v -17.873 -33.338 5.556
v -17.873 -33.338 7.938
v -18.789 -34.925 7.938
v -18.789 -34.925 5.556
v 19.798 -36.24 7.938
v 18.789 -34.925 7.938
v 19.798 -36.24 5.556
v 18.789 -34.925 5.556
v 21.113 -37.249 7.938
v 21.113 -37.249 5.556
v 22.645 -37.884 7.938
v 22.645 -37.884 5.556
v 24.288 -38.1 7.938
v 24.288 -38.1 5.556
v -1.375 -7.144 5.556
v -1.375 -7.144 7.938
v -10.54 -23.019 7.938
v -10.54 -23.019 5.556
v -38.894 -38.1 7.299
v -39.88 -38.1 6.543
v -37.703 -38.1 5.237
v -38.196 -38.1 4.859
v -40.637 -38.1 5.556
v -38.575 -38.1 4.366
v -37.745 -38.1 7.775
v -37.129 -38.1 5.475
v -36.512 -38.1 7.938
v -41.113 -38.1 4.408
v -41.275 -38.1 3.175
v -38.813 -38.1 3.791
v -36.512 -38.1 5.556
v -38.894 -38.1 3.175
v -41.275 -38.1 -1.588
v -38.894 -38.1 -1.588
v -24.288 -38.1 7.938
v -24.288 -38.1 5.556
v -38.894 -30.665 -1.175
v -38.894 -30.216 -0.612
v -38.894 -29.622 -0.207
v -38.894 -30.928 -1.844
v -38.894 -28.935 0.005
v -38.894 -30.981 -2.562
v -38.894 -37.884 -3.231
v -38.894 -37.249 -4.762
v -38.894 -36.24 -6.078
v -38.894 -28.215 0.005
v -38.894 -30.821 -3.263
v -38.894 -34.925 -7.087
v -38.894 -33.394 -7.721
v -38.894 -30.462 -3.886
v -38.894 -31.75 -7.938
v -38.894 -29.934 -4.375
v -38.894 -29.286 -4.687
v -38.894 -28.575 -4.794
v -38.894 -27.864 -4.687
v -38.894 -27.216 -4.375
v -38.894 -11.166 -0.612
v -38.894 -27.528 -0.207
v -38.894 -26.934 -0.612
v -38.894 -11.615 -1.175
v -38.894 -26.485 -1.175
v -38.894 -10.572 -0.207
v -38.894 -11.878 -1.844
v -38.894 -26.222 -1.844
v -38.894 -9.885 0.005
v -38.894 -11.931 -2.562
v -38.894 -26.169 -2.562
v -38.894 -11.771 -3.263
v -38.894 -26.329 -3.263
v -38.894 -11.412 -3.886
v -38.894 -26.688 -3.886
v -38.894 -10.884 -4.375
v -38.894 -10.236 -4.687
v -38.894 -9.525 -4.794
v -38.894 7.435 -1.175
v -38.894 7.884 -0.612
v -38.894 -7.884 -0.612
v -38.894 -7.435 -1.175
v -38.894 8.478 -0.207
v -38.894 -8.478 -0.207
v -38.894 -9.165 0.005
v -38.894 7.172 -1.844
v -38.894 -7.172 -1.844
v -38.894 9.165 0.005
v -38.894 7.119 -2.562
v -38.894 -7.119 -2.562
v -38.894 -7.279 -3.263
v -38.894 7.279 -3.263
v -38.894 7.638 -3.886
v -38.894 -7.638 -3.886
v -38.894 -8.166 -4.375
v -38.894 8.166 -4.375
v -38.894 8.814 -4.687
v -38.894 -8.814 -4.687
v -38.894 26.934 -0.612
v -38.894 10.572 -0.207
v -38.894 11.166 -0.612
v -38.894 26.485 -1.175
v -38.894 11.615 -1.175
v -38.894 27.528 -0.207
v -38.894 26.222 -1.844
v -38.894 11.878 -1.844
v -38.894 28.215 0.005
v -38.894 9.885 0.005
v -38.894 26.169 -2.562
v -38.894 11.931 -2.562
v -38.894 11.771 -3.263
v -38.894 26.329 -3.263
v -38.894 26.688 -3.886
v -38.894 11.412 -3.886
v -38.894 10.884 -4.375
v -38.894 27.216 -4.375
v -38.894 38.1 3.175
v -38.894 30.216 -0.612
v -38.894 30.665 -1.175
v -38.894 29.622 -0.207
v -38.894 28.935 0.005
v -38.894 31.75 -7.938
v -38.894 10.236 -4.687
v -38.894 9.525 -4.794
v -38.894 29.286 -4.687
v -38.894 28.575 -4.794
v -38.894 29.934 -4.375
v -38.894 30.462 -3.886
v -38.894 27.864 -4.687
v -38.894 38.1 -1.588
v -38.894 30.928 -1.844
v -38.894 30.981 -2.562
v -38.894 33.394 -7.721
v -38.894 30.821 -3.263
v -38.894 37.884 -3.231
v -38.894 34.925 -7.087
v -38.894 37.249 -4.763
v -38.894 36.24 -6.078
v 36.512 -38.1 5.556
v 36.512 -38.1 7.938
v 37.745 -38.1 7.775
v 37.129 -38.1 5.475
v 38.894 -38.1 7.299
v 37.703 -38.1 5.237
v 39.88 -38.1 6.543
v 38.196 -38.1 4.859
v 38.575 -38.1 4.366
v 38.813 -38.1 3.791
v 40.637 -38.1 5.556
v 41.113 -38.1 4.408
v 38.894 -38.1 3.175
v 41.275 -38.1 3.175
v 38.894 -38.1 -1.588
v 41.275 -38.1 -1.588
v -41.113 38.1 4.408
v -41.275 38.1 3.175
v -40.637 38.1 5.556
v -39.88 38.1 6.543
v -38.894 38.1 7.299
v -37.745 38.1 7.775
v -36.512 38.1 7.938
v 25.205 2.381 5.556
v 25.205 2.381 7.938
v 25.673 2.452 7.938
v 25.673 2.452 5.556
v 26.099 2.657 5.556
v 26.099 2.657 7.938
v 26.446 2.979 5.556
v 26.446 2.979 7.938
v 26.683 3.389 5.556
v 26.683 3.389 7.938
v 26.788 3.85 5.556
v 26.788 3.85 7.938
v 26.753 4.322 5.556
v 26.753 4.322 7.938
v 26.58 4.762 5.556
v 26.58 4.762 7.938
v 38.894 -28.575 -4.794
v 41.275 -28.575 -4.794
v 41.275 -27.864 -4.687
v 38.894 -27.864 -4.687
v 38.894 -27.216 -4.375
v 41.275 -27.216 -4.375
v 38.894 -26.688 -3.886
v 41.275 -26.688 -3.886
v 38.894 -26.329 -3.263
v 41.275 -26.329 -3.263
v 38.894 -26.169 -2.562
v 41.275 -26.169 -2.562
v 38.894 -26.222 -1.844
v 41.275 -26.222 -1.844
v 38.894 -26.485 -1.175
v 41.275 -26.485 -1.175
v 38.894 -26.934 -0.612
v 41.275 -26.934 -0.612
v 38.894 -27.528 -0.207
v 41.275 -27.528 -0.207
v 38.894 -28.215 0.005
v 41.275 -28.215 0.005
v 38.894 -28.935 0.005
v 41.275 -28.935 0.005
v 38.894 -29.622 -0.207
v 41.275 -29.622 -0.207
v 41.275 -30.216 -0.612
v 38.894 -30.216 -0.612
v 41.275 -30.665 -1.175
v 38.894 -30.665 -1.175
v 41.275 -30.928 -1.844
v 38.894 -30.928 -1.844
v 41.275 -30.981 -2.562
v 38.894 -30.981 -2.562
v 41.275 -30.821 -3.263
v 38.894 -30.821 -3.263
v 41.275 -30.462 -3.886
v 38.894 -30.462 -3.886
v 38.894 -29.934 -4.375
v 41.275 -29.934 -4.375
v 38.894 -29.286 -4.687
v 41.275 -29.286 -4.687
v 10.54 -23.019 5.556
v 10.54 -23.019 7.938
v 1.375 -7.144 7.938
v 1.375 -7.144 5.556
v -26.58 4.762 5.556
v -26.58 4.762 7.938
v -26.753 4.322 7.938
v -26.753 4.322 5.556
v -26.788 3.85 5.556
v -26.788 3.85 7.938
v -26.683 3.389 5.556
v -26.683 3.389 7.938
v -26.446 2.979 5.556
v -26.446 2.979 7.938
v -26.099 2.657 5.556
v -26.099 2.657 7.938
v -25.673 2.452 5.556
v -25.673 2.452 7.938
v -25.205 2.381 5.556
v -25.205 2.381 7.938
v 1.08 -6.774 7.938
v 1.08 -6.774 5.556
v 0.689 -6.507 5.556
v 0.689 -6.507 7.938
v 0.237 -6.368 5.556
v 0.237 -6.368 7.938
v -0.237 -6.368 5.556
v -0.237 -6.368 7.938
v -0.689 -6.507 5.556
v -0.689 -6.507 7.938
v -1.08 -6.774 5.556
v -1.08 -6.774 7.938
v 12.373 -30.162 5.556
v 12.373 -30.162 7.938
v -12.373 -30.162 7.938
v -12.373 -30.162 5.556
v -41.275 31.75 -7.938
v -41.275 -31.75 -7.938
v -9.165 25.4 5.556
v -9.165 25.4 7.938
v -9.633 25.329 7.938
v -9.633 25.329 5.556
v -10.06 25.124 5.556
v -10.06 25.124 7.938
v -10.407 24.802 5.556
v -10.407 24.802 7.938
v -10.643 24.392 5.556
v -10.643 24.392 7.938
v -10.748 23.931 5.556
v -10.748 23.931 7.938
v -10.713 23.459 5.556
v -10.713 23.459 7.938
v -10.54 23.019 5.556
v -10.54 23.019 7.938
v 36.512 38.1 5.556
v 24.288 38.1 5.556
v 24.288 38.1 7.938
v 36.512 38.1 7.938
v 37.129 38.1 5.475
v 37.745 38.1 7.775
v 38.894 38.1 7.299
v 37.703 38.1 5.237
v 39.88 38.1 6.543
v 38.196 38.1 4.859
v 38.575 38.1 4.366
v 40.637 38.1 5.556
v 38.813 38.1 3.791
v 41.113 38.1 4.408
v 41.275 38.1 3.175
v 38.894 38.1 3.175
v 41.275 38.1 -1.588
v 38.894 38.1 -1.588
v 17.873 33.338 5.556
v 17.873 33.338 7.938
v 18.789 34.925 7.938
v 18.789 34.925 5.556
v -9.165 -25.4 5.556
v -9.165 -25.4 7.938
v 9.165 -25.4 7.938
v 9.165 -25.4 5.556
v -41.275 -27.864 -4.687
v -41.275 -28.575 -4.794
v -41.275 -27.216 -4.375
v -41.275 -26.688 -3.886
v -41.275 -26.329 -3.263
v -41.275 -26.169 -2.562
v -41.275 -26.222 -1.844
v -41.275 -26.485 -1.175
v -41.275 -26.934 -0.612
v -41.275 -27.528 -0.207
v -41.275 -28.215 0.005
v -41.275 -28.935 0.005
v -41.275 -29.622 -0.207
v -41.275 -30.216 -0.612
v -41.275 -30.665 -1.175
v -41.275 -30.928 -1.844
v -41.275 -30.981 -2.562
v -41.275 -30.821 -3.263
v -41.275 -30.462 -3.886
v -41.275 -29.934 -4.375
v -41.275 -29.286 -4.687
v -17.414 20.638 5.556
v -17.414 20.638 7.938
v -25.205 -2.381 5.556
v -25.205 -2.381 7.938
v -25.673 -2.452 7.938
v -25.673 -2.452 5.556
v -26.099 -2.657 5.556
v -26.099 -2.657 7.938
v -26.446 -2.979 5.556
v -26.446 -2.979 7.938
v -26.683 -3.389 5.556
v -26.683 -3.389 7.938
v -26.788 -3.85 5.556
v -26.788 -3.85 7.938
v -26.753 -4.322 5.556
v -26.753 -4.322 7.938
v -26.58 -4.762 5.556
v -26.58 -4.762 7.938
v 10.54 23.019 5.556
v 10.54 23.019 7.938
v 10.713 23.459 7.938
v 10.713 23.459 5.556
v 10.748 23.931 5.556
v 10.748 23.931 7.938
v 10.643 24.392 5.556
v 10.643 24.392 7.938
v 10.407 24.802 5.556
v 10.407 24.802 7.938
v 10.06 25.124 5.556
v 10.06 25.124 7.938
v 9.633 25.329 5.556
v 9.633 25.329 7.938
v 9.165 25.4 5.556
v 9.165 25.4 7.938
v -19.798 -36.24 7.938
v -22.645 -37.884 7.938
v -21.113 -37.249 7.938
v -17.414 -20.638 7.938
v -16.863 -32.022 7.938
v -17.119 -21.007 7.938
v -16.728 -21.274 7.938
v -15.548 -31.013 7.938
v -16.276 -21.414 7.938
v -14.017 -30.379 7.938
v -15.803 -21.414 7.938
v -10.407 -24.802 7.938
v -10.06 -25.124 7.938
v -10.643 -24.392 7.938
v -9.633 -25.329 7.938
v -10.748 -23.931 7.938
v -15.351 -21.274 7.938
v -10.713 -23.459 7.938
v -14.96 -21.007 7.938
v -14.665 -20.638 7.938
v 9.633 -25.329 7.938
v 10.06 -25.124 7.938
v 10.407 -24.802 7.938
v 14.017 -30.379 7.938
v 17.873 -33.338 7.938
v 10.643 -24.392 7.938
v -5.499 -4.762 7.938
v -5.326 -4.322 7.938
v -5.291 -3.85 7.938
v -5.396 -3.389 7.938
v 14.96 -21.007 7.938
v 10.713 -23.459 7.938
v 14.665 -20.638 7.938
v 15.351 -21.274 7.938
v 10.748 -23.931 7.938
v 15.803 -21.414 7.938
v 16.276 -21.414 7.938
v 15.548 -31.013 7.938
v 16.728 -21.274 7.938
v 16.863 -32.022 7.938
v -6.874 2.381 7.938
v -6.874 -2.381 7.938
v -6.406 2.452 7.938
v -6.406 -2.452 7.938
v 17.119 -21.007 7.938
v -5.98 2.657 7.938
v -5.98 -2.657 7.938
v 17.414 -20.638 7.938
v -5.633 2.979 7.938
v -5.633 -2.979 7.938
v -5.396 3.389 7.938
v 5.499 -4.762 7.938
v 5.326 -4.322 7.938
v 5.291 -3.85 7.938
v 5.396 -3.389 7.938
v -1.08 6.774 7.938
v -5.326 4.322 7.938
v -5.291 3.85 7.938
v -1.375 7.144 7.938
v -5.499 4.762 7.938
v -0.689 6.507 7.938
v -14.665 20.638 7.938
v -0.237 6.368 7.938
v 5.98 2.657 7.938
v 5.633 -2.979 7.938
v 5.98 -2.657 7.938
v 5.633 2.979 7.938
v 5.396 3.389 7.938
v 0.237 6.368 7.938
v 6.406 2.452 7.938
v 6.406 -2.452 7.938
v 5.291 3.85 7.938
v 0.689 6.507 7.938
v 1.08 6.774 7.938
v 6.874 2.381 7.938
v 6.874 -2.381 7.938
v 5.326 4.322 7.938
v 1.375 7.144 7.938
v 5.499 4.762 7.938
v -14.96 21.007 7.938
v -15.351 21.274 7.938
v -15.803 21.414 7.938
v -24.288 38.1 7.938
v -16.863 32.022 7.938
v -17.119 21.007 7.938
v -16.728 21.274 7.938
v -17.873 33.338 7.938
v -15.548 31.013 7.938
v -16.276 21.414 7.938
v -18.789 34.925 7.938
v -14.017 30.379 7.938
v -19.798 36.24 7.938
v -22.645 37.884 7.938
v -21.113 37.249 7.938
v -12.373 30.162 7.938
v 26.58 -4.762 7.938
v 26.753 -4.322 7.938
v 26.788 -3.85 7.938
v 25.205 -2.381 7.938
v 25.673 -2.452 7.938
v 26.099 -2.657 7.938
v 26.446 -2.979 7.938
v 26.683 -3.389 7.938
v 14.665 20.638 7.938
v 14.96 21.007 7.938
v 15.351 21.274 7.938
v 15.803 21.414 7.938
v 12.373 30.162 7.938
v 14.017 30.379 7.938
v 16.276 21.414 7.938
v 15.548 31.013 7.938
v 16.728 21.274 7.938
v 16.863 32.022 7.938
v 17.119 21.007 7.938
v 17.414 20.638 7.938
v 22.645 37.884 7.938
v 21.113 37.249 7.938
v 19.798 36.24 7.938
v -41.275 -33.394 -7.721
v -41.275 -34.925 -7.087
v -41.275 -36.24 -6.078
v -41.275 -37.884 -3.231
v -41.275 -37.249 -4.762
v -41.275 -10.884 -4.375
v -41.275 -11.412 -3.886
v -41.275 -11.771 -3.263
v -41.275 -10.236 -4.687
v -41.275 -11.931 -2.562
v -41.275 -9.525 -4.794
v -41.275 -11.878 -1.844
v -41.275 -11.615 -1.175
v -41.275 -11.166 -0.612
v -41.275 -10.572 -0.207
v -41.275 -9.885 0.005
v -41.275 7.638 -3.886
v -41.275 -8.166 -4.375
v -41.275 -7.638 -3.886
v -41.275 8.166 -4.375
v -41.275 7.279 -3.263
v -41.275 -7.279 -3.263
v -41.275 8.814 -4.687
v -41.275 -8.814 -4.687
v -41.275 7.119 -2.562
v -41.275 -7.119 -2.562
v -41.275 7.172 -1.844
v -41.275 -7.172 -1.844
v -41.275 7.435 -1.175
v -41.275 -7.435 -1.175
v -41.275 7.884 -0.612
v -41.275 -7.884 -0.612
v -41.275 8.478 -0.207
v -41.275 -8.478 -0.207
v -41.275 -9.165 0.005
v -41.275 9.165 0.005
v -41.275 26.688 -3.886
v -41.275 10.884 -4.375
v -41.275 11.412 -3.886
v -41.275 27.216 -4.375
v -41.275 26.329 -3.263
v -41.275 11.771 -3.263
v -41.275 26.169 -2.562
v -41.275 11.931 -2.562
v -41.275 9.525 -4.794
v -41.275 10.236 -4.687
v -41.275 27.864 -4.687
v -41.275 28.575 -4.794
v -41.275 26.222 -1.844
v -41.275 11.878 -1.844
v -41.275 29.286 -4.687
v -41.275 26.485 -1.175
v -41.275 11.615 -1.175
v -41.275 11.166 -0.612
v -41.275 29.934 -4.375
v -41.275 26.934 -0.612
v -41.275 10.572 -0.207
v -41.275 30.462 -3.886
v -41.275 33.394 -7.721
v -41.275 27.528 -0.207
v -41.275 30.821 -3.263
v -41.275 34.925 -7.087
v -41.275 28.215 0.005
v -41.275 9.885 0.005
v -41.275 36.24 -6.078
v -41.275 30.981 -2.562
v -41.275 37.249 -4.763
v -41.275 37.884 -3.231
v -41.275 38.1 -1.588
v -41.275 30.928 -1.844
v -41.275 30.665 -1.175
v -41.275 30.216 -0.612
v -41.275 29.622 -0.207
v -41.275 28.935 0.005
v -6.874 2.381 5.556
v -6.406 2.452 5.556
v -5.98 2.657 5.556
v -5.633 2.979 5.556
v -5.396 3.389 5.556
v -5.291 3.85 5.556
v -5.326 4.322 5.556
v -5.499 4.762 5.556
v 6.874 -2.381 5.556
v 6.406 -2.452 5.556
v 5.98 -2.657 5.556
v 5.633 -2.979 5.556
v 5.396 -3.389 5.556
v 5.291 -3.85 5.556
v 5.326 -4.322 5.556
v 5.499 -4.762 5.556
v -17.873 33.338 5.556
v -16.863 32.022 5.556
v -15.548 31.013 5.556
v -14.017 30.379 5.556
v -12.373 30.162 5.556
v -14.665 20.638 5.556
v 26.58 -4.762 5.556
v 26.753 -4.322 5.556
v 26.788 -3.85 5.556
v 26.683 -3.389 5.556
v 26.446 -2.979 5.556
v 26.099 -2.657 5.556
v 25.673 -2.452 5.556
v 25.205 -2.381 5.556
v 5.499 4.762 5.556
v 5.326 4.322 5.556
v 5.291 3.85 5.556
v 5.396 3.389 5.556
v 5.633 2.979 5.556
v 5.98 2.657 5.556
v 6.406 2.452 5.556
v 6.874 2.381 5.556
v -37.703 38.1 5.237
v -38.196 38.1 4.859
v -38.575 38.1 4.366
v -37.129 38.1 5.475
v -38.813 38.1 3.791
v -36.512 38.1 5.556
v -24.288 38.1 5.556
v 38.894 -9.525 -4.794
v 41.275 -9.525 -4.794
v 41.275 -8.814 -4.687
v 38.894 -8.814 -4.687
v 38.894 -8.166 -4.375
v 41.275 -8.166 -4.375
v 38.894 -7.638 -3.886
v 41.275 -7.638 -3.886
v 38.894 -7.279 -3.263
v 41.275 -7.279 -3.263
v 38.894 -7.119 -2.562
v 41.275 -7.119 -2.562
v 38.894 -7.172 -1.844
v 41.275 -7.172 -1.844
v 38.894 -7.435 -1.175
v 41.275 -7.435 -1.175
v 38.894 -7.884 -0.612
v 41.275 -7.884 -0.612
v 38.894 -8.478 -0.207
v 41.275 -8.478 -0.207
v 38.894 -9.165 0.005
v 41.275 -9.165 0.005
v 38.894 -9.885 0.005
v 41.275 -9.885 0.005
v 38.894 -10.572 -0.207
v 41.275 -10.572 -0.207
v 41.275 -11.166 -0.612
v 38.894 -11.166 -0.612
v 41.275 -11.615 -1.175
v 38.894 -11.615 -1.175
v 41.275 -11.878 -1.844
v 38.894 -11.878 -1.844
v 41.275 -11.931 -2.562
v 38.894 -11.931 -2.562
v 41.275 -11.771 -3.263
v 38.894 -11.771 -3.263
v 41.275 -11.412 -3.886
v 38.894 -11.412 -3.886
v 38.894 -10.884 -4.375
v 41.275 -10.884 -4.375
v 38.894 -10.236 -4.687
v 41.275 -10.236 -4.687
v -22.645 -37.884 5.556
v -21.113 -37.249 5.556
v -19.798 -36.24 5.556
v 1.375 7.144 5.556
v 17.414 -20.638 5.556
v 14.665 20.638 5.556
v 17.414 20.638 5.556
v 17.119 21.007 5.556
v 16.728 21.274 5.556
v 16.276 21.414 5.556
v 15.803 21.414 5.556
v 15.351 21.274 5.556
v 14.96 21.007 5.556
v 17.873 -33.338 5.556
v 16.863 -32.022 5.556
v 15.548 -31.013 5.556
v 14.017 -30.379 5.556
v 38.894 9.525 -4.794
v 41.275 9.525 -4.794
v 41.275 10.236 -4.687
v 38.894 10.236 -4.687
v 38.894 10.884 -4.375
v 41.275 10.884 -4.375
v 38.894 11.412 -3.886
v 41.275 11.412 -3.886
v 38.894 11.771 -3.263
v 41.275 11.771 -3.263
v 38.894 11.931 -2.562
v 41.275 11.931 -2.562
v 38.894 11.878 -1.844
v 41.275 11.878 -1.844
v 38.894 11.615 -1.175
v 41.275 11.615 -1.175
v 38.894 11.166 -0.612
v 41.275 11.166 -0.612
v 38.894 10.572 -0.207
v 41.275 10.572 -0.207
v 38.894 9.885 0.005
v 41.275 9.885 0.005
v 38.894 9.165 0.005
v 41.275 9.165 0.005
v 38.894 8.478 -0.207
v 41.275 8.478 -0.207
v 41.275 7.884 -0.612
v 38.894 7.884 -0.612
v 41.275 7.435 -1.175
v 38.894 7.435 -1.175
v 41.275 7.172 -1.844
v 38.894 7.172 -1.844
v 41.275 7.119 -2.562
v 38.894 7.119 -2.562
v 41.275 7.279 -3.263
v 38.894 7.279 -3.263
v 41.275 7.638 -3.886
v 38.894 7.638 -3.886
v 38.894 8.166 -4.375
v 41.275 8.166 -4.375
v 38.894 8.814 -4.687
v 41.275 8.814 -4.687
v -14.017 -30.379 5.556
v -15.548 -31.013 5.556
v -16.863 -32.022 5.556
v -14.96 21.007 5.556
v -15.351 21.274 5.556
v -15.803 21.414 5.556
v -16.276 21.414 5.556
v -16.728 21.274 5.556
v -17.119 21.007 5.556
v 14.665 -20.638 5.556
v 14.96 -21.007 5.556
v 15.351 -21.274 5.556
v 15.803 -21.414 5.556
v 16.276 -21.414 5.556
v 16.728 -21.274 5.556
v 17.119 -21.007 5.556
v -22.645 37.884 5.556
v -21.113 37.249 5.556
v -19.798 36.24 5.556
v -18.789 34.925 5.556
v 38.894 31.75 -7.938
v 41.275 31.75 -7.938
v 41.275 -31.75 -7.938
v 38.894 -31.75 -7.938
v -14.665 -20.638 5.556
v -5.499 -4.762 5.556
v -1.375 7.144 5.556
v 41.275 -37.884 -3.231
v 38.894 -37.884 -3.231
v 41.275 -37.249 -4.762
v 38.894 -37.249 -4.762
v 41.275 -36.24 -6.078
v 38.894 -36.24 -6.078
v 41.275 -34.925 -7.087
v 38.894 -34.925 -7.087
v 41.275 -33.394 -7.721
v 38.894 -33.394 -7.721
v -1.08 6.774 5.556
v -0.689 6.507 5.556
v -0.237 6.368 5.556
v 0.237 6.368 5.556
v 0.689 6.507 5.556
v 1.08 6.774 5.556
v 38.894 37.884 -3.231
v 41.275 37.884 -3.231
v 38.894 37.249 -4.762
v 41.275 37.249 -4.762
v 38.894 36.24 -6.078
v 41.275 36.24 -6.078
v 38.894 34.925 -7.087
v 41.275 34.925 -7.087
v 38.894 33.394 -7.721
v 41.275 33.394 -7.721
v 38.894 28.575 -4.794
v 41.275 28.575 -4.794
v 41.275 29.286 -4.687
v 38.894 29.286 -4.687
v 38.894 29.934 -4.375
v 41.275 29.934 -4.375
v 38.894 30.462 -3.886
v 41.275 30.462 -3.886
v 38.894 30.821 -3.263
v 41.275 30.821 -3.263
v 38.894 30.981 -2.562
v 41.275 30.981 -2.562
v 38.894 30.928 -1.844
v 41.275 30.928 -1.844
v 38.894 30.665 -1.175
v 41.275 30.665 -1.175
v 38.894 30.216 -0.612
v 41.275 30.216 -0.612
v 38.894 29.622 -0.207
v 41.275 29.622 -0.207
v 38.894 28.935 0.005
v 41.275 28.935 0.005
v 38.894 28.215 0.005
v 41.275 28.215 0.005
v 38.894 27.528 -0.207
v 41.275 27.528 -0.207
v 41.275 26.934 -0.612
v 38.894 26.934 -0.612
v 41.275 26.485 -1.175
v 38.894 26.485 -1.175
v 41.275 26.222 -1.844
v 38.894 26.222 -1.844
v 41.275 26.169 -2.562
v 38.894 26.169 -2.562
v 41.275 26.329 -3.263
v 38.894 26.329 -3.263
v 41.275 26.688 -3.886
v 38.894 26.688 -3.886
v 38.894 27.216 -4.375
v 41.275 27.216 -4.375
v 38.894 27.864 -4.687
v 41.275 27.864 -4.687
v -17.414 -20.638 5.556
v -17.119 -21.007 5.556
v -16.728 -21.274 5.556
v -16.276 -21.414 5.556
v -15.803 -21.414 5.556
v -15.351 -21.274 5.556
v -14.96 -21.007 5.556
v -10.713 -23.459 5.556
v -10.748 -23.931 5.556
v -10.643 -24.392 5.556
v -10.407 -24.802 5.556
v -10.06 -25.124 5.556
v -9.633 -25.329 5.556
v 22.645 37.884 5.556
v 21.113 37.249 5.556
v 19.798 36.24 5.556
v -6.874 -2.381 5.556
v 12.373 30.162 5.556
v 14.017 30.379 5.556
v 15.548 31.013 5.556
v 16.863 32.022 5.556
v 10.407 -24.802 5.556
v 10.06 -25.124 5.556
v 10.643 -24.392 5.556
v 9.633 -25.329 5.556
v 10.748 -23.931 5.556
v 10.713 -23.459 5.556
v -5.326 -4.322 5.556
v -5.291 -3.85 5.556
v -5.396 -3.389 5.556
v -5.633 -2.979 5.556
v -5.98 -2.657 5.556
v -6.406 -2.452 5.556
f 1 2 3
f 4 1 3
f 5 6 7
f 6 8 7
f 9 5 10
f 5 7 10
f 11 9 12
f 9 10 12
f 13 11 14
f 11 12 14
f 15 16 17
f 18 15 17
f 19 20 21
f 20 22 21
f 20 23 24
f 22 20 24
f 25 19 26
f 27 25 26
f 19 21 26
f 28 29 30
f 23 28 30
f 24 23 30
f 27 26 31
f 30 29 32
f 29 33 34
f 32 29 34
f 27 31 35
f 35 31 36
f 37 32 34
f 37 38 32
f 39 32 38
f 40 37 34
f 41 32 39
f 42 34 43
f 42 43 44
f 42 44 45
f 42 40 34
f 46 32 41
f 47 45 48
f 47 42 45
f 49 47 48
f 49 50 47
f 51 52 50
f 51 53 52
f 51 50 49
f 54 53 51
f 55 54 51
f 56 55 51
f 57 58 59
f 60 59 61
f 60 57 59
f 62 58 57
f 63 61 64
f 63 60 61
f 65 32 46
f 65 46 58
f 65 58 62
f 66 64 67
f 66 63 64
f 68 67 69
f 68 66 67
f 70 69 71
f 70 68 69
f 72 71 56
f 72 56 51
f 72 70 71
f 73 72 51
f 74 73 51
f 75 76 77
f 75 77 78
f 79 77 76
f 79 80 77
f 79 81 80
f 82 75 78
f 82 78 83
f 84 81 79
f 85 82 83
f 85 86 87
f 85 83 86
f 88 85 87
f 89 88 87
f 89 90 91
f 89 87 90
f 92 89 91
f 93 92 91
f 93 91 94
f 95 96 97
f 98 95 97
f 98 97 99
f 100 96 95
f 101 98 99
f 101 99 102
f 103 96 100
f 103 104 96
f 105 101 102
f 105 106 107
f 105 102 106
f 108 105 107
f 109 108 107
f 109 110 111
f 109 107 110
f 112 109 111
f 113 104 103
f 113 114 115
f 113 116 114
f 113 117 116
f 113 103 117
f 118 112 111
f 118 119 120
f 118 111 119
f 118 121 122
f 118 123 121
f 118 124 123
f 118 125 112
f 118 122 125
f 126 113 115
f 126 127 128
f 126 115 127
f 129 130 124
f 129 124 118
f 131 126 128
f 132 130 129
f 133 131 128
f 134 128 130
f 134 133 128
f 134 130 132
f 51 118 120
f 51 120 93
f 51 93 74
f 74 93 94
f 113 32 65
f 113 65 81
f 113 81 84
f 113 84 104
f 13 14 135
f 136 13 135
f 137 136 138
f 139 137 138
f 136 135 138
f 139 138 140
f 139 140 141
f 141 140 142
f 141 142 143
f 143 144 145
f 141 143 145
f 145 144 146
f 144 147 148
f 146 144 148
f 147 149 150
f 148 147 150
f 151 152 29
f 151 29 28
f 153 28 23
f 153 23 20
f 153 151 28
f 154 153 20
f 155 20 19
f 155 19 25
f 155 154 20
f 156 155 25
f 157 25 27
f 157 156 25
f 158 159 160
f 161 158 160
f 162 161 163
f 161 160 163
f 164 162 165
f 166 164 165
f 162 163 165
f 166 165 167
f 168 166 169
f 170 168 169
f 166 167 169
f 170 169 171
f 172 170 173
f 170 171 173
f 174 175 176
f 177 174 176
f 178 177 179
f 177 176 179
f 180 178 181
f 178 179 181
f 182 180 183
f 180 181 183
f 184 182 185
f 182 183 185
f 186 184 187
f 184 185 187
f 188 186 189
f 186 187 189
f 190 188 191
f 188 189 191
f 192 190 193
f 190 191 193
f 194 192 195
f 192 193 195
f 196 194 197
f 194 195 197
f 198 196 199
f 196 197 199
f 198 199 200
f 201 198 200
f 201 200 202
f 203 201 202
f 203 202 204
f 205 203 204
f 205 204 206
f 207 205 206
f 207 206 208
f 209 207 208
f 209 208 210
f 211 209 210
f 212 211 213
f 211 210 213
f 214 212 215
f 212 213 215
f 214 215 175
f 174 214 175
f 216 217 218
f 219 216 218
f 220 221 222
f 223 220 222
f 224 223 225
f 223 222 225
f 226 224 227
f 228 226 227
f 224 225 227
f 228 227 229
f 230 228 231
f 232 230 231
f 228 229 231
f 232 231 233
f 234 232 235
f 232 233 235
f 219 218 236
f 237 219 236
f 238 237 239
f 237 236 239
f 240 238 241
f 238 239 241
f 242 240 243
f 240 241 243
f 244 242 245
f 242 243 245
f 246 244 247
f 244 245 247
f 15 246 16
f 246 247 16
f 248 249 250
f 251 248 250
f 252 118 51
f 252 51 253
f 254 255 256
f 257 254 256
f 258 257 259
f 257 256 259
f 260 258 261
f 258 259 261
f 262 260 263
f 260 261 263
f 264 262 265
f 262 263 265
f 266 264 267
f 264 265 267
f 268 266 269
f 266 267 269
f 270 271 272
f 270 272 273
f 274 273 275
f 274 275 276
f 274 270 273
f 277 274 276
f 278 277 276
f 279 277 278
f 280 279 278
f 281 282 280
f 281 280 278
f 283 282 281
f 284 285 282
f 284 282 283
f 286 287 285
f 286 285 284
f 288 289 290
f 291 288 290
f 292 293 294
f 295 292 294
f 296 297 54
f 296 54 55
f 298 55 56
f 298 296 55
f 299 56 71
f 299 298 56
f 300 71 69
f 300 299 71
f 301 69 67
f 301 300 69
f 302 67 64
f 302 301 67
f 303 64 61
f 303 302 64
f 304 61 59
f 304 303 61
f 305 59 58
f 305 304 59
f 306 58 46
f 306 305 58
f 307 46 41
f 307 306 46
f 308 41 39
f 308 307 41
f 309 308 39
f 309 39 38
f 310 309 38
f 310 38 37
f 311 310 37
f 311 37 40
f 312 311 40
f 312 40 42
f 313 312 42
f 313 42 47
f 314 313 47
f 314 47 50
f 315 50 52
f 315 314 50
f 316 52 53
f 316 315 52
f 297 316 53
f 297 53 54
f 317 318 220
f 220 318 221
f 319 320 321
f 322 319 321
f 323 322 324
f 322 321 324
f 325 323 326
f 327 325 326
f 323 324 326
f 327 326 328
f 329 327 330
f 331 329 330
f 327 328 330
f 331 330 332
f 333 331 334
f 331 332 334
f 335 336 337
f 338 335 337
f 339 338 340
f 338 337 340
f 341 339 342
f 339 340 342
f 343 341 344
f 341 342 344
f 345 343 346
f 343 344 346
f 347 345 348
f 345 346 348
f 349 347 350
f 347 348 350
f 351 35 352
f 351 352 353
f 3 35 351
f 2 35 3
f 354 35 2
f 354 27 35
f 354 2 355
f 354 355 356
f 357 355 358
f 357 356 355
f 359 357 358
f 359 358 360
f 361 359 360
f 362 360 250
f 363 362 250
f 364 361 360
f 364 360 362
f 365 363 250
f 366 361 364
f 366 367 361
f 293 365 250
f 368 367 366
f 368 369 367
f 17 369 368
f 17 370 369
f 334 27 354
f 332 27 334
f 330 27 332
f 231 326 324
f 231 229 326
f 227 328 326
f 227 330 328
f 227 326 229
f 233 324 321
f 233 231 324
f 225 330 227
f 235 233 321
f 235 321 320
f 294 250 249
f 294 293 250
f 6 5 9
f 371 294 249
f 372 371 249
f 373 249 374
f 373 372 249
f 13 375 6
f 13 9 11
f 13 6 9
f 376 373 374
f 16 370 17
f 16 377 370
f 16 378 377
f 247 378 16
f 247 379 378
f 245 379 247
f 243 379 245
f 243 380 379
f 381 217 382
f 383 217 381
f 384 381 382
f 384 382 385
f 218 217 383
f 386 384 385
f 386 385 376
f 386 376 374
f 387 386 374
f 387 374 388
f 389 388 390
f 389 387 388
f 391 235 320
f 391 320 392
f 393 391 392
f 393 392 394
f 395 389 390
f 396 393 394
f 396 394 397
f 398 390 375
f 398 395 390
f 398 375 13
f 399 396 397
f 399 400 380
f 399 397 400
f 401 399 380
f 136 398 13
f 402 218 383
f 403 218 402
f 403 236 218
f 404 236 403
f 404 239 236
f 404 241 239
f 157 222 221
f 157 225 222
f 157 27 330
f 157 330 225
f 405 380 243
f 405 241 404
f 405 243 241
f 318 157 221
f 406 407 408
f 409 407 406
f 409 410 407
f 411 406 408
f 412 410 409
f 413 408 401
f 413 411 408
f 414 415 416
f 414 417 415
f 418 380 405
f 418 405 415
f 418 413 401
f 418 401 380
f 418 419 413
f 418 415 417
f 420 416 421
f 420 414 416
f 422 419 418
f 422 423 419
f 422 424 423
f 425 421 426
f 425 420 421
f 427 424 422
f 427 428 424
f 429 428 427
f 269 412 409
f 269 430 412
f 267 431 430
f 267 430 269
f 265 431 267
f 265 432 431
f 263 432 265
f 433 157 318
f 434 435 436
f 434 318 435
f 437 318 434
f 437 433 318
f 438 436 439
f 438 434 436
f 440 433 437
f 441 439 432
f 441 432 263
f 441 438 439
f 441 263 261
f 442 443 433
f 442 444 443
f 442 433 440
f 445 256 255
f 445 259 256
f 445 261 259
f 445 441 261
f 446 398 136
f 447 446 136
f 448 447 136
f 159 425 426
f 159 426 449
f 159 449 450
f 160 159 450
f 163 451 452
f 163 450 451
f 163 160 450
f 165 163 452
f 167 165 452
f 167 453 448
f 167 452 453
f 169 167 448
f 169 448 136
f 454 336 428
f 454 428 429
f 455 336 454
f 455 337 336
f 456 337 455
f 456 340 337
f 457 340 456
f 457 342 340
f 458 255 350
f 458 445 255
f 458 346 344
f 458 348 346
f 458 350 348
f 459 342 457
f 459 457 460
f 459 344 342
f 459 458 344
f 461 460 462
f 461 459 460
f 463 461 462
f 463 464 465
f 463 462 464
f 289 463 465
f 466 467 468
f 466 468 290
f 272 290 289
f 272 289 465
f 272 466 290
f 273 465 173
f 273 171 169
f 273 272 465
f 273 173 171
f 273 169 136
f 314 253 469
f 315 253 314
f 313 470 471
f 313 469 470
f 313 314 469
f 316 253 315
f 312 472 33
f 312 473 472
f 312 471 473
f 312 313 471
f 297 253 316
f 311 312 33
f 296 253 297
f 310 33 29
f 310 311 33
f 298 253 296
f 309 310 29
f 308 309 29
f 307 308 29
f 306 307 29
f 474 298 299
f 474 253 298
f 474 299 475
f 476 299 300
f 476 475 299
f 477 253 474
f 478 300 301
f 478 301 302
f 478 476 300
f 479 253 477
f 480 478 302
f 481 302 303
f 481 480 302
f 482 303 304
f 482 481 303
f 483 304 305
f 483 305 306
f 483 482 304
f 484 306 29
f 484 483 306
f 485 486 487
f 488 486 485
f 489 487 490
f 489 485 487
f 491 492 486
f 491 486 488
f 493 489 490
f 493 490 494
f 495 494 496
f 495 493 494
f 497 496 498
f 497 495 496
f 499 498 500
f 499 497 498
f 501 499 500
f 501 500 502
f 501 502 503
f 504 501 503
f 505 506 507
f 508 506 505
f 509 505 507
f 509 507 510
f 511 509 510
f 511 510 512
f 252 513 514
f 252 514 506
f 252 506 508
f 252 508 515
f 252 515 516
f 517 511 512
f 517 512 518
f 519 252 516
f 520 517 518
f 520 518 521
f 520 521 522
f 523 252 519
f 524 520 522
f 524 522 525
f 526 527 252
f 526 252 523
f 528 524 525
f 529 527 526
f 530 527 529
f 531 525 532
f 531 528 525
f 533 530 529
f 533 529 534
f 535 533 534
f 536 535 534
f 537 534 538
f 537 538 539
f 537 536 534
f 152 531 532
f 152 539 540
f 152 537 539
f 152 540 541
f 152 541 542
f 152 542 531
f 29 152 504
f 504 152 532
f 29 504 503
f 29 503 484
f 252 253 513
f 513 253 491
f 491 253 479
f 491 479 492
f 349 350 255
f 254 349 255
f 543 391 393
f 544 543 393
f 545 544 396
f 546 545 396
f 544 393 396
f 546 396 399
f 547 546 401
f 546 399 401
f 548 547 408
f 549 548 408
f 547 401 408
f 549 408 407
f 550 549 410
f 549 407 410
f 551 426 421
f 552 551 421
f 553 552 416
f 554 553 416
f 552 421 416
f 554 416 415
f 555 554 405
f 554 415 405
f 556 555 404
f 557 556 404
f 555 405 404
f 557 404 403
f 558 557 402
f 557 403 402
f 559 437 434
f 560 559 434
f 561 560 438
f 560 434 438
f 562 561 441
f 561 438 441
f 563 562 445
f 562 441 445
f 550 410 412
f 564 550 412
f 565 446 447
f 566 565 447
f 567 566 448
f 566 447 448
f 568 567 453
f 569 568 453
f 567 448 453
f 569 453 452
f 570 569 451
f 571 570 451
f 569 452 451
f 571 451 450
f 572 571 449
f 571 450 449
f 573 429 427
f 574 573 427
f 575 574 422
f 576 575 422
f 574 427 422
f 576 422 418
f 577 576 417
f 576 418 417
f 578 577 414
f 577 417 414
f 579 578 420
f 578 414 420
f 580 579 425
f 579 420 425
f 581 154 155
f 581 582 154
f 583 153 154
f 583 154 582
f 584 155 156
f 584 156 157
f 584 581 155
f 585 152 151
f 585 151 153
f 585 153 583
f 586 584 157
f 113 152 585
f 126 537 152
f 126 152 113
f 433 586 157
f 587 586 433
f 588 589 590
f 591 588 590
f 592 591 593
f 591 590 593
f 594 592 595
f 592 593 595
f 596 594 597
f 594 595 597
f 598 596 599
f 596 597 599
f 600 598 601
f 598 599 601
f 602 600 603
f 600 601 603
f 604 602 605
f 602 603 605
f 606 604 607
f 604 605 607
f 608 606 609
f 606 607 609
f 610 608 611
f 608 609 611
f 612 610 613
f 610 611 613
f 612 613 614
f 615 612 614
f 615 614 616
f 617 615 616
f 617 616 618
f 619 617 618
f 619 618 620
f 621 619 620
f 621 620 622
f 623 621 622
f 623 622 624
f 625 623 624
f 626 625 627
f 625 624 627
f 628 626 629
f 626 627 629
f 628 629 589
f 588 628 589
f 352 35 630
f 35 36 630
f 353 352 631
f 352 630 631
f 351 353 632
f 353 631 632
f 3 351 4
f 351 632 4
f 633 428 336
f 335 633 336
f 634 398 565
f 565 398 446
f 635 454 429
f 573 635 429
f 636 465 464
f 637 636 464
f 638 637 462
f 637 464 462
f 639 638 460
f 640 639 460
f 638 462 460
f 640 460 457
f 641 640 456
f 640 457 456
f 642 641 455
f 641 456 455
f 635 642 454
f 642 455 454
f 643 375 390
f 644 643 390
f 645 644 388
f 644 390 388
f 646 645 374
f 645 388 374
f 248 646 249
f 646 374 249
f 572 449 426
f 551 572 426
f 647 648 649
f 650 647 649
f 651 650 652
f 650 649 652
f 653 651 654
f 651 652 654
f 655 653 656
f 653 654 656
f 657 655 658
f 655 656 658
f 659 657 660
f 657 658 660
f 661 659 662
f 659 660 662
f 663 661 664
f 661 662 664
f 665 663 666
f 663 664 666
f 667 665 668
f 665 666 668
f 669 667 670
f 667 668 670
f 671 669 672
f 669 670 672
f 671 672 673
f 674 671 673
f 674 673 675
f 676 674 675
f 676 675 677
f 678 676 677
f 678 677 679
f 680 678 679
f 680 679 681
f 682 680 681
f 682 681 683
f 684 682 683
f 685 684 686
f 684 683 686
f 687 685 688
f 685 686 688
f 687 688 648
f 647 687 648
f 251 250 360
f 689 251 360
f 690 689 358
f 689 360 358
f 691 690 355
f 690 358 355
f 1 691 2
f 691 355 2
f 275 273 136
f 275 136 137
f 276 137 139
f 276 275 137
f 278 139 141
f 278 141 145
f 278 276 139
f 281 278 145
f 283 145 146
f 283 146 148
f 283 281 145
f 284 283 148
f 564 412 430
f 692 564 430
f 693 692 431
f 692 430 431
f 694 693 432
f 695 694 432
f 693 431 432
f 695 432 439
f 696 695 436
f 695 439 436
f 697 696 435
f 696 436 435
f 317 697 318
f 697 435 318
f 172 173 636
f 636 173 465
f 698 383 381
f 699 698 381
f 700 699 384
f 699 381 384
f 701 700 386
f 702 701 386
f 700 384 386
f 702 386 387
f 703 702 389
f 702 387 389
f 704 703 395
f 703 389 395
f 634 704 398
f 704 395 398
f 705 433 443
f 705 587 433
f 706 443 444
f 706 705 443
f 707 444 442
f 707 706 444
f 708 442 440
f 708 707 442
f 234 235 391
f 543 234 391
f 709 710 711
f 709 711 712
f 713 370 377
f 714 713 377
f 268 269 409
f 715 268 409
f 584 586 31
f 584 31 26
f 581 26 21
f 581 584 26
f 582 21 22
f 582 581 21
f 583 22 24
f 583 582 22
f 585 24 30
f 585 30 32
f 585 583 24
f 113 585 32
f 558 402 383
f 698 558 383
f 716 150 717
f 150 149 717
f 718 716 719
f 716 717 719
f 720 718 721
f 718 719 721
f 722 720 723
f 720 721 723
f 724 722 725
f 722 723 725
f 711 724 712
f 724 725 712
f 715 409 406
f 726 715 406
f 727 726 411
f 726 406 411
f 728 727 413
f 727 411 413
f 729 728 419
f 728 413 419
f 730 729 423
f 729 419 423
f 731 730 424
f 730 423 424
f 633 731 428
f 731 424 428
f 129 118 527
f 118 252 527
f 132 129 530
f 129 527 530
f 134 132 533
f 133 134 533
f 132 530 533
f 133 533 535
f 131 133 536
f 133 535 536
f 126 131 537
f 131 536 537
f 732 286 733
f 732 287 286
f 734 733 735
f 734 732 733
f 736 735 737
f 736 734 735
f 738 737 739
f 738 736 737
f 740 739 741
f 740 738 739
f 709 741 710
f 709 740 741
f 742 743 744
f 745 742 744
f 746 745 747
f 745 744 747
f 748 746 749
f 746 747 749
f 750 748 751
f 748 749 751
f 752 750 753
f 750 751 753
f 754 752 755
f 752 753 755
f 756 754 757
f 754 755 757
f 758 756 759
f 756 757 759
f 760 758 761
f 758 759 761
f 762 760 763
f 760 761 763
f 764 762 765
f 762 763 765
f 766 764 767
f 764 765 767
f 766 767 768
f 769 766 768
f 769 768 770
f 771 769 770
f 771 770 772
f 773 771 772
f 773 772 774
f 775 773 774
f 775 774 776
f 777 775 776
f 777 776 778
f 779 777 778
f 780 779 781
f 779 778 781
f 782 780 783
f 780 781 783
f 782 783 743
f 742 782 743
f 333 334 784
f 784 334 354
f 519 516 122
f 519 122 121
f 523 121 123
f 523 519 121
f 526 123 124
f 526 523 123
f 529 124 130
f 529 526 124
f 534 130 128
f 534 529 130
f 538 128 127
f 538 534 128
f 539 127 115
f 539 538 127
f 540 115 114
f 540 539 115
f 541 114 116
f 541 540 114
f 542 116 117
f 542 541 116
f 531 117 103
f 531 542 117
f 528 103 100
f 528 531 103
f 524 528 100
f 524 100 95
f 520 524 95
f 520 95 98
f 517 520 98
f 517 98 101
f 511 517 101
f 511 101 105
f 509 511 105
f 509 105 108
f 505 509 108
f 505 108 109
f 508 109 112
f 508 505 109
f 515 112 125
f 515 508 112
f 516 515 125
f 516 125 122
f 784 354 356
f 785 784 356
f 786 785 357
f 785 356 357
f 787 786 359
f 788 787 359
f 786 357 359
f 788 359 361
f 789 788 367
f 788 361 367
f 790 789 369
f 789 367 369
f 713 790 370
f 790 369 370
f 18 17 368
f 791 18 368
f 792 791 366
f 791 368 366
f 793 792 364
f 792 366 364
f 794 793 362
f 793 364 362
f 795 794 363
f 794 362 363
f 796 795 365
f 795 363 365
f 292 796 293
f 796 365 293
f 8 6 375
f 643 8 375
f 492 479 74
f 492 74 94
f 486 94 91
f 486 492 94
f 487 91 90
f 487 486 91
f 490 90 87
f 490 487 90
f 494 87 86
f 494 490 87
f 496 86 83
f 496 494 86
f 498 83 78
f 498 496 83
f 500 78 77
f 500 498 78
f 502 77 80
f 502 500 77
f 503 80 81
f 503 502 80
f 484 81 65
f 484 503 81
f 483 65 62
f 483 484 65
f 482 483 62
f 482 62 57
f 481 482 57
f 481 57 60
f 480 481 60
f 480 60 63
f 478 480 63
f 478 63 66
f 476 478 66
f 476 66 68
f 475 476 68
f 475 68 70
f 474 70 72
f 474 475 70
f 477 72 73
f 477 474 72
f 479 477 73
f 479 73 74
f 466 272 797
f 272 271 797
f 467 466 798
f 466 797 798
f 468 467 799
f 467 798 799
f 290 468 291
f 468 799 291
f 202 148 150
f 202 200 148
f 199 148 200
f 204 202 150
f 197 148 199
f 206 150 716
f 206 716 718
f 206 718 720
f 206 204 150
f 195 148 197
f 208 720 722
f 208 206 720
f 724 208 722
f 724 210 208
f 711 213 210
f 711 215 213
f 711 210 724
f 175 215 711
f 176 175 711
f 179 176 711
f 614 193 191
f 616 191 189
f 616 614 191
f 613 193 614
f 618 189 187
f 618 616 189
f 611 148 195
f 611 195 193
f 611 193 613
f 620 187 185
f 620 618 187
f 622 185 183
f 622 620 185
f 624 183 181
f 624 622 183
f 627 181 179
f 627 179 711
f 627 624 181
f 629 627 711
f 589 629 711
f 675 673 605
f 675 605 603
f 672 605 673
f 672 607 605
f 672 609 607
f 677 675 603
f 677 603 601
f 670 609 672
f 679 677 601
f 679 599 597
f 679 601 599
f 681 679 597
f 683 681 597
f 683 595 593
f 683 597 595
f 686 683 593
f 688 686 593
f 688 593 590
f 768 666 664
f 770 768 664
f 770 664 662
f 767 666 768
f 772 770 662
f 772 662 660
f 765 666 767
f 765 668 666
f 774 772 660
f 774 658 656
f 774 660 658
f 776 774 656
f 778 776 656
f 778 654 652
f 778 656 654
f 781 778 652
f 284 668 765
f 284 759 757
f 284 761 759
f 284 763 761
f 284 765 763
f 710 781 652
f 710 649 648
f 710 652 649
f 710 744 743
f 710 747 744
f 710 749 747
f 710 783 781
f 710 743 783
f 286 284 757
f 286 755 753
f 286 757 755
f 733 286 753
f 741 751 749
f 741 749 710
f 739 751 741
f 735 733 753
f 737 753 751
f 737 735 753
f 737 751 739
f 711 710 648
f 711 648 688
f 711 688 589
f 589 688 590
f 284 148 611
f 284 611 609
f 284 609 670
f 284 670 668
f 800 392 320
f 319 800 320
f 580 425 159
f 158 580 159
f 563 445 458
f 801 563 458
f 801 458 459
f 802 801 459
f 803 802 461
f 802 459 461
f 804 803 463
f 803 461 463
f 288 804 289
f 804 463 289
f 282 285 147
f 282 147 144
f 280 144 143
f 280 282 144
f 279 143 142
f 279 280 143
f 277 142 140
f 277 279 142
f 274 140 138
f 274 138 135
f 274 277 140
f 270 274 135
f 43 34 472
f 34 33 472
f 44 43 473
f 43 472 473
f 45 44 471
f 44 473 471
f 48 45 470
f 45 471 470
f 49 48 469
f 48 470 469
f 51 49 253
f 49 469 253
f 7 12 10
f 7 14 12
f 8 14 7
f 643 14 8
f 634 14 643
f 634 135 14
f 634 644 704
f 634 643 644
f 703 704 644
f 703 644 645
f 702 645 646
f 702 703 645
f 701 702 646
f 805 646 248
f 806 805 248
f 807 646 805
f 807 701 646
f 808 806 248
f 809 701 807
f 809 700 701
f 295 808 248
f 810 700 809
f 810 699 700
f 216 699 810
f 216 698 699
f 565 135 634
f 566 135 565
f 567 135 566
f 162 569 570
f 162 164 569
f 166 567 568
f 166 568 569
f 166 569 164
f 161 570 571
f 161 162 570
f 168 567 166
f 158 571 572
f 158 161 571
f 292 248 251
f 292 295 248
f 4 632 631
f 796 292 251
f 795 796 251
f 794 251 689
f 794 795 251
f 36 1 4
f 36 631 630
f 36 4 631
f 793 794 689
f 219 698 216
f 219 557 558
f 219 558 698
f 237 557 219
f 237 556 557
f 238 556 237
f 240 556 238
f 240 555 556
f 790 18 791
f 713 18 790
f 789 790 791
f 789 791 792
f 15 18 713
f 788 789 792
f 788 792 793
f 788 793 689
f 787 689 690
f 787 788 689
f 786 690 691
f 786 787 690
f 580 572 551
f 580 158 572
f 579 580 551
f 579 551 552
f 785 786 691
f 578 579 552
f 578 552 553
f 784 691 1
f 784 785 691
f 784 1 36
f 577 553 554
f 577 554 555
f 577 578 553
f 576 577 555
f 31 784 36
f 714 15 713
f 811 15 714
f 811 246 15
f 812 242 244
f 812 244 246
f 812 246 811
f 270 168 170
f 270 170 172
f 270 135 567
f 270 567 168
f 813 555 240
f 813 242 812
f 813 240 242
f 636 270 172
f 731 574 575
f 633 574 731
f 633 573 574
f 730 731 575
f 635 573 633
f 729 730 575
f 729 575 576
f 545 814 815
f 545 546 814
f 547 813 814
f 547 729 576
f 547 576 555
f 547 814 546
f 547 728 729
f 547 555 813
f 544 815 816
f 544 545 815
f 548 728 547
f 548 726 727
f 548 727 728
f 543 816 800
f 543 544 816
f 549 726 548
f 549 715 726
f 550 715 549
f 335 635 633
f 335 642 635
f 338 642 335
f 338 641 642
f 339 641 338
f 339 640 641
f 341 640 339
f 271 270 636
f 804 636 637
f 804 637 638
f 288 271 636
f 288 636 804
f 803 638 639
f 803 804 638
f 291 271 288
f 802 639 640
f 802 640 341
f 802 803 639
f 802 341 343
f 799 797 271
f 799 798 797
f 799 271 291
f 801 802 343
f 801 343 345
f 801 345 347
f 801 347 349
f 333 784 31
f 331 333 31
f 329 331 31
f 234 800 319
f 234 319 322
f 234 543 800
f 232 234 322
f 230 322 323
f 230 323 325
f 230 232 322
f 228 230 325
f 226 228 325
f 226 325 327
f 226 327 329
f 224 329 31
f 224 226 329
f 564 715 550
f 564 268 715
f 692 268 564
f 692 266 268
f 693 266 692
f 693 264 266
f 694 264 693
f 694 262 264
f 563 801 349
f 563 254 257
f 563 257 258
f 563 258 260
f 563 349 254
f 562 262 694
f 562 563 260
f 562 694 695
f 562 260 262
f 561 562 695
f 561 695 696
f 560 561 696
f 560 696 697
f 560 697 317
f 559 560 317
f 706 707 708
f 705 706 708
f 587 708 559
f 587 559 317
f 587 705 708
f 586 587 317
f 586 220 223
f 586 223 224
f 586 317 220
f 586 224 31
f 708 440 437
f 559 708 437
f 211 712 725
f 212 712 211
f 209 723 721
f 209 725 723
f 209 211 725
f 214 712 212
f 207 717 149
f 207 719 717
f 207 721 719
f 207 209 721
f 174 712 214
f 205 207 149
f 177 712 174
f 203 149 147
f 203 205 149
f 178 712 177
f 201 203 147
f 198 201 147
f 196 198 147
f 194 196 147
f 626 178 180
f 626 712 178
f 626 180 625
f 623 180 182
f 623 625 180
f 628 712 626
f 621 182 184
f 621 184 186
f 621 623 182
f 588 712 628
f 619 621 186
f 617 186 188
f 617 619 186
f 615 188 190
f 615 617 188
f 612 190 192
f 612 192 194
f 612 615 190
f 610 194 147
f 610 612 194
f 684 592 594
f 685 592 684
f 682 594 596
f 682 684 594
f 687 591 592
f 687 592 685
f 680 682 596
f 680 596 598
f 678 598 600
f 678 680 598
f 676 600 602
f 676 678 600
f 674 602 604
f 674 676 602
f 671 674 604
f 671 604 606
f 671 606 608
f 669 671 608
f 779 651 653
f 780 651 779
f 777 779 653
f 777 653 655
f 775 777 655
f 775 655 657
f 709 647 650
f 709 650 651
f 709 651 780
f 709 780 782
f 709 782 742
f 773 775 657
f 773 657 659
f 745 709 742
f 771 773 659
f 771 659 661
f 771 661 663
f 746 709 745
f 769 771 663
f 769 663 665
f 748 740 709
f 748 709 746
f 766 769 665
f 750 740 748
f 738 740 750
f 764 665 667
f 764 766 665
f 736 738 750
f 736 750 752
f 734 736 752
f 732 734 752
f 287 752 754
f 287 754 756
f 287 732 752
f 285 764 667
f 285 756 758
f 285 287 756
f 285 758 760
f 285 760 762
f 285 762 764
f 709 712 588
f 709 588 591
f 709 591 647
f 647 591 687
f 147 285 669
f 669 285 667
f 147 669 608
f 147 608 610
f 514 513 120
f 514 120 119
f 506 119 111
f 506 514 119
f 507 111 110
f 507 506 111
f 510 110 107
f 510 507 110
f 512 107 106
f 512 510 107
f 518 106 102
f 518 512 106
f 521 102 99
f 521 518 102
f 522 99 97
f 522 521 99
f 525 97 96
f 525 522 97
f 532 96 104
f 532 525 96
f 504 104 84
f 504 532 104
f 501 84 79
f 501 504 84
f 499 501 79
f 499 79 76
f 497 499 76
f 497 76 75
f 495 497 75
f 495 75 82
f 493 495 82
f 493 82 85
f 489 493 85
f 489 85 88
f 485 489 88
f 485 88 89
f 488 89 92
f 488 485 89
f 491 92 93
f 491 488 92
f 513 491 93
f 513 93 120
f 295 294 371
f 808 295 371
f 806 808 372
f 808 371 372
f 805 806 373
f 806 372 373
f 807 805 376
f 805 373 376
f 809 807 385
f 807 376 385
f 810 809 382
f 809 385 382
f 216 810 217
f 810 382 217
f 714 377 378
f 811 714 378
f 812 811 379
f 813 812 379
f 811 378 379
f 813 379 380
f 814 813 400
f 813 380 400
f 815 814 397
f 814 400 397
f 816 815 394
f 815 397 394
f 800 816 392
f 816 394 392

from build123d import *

# Parameters (mm, degrees)
BASE_FLANGE1_DEPTH = 38.1
CUT_EXTRUDE1_DEPTH = 2.38125
FILLET1_R          = 6.35
SKETCH7_R          = 2.413
CUT_EXTRUDE2_DEPTH = 2.38125
FILLET2_R          = 6.35


# Sheet-metal steps are written as plain solids
with BuildPart() as part:
    # Sketch1 → Base-Flange1 (new, symmetric)
    with BuildSketch(Plane(origin=(0, 0, 0), x_dir=(1, 0, 0), z_dir=(0, 1, 0))):
        with BuildLine():
            Line((-41.275, 7.9375), (-41.275, -3.175))
            ThreePointArc((-41.275, -3.175), (-39.880096045, -6.542596045), (-36.5125, -7.9375))
            Line((-36.5125, -7.9375), (36.5125, -7.9375))
            ThreePointArc((36.5125, -7.9375), (39.880096045, -6.542596045), (41.275, -3.175))
            Line((41.275, -3.175), (41.275, 7.9375))
            Line((41.275, 7.9375), (38.89375, 7.9375))
            Line((38.89375, 7.9375), (38.89375, -3.175))
            ThreePointArc((38.89375, -3.175), (38.196298023, -4.858798023), (36.5125, -5.55625))
            Line((36.5125, -5.55625), (-36.5125, -5.55625))
            ThreePointArc((-36.5125, -5.55625), (-38.196298023, -4.858798023), (-38.89375, -3.175))
            Line((-38.89375, -3.175), (-38.89375, 7.9375))
            Line((-38.89375, 7.9375), (-41.275, 7.9375))
        make_face()
    extrude(amount=BASE_FLANGE1_DEPTH, both=True)

    # Sketch6 → Cut-Extrude1 (cut)
    with BuildSketch(Plane.XY.offset(7.9375)):
        with BuildLine():
            Line((-10.540250852, 23.01875), (-1.374815329, 7.14375))
            ThreePointArc((-1.374815329, 7.14375), (0, 6.35), (1.374815329, 7.14375))
            Line((1.374815329, 7.14375), (10.540250852, 23.01875))
            ThreePointArc((10.540250852, 23.01875), (10.540250852, 24.60625), (9.165435523, 25.4))
            Line((9.165435523, 25.4), (-9.165435523, 25.4))
            ThreePointArc((-9.165435523, 25.4), (-10.540250852, 24.60625), (-10.540250852, 23.01875))
        make_face()
        with BuildLine():
            Line((14.664696837, 20.6375), (5.499261314, 4.7625))
            ThreePointArc((5.499261314, 4.7625), (5.499261314, 3.175), (6.874076643, 2.38125))
            Line((6.874076643, 2.38125), (25.204947689, 2.38125))
            ThreePointArc((25.204947689, 2.38125), (26.579763018, 3.175), (26.579763018, 4.7625))
            Line((26.579763018, 4.7625), (17.414327494, 20.6375))
            ThreePointArc((17.414327494, 20.6375), (16.039512166, 21.43125), (14.664696837, 20.6375))
        make_face()
        with BuildLine():
            Line((25.204947689, -2.38125), (6.874076643, -2.38125))
            ThreePointArc((6.874076643, -2.38125), (5.499261314, -3.175), (5.499261314, -4.7625))
            Line((5.499261314, -4.7625), (14.664696837, -20.6375))
            ThreePointArc((14.664696837, -20.6375), (16.039512166, -21.43125), (17.414327494, -20.6375))
            Line((17.414327494, -20.6375), (26.579763018, -4.7625))
            ThreePointArc((26.579763018, -4.7625), (26.579763018, -3.175), (25.204947689, -2.38125))
        make_face()
        with BuildLine():
            Line((10.540250852, -23.01875), (1.374815329, -7.14375))
            ThreePointArc((1.374815329, -7.14375), (0, -6.35), (-1.374815329, -7.14375))
            Line((-1.374815329, -7.14375), (-10.540250852, -23.01875))
            ThreePointArc((-10.540250852, -23.01875), (-10.540250852, -24.60625), (-9.165435523, -25.4))
            Line((-9.165435523, -25.4), (9.165435523, -25.4))
            ThreePointArc((9.165435523, -25.4), (10.540250852, -24.60625), (10.540250852, -23.01875))
        make_face()
        with BuildLine():
            Line((-14.664696837, -20.6375), (-5.499261314, -4.7625))
            ThreePointArc((-5.499261314, -4.7625), (-5.499261314, -3.175), (-6.874076643, -2.38125))
            Line((-6.874076643, -2.38125), (-25.204947689, -2.38125))
            ThreePointArc((-25.204947689, -2.38125), (-26.579763018, -3.175), (-26.579763018, -4.7625))
            Line((-26.579763018, -4.7625), (-17.414327494, -20.6375))
            ThreePointArc((-17.414327494, -20.6375), (-16.039512166, -21.43125), (-14.664696837, -20.6375))
        make_face()
        with BuildLine():
            Line((-25.204947689, 2.38125), (-6.874076643, 2.38125))
            ThreePointArc((-6.874076643, 2.38125), (-5.499261314, 3.175), (-5.499261314, 4.7625))
            Line((-5.499261314, 4.7625), (-14.664696837, 20.6375))
            ThreePointArc((-14.664696837, 20.6375), (-16.039512166, 21.43125), (-17.414327494, 20.6375))
            Line((-17.414327494, 20.6375), (-26.579763018, 4.7625))
            ThreePointArc((-26.579763018, 4.7625), (-26.579763018, 3.175), (-25.204947689, 2.38125))
        make_face()
        with BuildLine():
            Line((-20.622229928, 38.1), (-17.872599271, 33.3375))
            ThreePointArc((-17.872599271, 33.3375), (-15.548337957, 31.013238686), (-12.373337957, 30.1625))
            Line((-12.373337957, 30.1625), (12.373337957, 30.1625))
            ThreePointArc((12.373337957, 30.1625), (15.548337957, 31.013238686), (17.872599271, 33.3375))
            Line((17.872599271, 33.3375), (20.622229928, 38.1))
            Line((20.622229928, 38.1), (-20.622229928, 38.1))
        make_face()
        with BuildLine():
            Line((-20.622229928, -38.1), (20.622229928, -38.1))
            Line((20.622229928, -38.1), (17.872599271, -33.3375))
            ThreePointArc((17.872599271, -33.3375), (15.548337957, -31.013238686), (12.373337957, -30.1625))
            Line((12.373337957, -30.1625), (-12.373337957, -30.1625))
            ThreePointArc((-12.373337957, -30.1625), (-15.548337957, -31.013238686), (-17.872599271, -33.3375))
            Line((-17.872599271, -33.3375), (-20.622229928, -38.1))
        make_face()
    extrude(amount=-CUT_EXTRUDE1_DEPTH, mode=Mode.SUBTRACT)

    # Fillet1
    fillet1_edges = [part.edges().sort_by_distance(p)[0] for p in [
        (20.622229928, -38.1, 6.746875),
        (-20.622229928, -38.1, 6.746875),
        (-20.622229928, 38.1, 6.746875),
        (20.622229928, 38.1, 6.746875),
    ]]
    fillet(fillet1_edges, radius=FILLET1_R)

    # Sketch7 → Cut-Extrude2 (cut)
    with BuildSketch(Plane(origin=(41.275, 0, 0), x_dir=(0, 0, -1), z_dir=(1, 0, 0))):
        with Locations((2.38125, 28.575)):
            Circle(SKETCH7_R)
        with Locations((2.38125, 9.525)):
            Circle(SKETCH7_R)
        with Locations((2.38125, -9.525)):
            Circle(SKETCH7_R)
        with Locations((2.38125, -28.575)):
            Circle(SKETCH7_R)
    cut_extrude2 = extrude(amount=-CUT_EXTRUDE2_DEPTH, mode=Mode.SUBTRACT)

    # Mirror1: Cut-Extrude2 across plane
    add(cut_extrude2.mirror(Plane(origin=(0, 0, 0), x_dir=(0, 0, 1), z_dir=(1, 0, 0))), mode=Mode.SUBTRACT)

    # Fillet2
    fillet2_edges = [part.edges().sort_by_distance(p)[0] for p in [
        (40.084375, 38.1, -7.9375),
        (-40.084375, 38.1, -7.9375),
        (40.084375, -38.1, -7.9375),
        (-40.084375, -38.1, -7.9375),
    ]]
    fillet(fillet2_edges, radius=FILLET2_R)


solid = part.part
